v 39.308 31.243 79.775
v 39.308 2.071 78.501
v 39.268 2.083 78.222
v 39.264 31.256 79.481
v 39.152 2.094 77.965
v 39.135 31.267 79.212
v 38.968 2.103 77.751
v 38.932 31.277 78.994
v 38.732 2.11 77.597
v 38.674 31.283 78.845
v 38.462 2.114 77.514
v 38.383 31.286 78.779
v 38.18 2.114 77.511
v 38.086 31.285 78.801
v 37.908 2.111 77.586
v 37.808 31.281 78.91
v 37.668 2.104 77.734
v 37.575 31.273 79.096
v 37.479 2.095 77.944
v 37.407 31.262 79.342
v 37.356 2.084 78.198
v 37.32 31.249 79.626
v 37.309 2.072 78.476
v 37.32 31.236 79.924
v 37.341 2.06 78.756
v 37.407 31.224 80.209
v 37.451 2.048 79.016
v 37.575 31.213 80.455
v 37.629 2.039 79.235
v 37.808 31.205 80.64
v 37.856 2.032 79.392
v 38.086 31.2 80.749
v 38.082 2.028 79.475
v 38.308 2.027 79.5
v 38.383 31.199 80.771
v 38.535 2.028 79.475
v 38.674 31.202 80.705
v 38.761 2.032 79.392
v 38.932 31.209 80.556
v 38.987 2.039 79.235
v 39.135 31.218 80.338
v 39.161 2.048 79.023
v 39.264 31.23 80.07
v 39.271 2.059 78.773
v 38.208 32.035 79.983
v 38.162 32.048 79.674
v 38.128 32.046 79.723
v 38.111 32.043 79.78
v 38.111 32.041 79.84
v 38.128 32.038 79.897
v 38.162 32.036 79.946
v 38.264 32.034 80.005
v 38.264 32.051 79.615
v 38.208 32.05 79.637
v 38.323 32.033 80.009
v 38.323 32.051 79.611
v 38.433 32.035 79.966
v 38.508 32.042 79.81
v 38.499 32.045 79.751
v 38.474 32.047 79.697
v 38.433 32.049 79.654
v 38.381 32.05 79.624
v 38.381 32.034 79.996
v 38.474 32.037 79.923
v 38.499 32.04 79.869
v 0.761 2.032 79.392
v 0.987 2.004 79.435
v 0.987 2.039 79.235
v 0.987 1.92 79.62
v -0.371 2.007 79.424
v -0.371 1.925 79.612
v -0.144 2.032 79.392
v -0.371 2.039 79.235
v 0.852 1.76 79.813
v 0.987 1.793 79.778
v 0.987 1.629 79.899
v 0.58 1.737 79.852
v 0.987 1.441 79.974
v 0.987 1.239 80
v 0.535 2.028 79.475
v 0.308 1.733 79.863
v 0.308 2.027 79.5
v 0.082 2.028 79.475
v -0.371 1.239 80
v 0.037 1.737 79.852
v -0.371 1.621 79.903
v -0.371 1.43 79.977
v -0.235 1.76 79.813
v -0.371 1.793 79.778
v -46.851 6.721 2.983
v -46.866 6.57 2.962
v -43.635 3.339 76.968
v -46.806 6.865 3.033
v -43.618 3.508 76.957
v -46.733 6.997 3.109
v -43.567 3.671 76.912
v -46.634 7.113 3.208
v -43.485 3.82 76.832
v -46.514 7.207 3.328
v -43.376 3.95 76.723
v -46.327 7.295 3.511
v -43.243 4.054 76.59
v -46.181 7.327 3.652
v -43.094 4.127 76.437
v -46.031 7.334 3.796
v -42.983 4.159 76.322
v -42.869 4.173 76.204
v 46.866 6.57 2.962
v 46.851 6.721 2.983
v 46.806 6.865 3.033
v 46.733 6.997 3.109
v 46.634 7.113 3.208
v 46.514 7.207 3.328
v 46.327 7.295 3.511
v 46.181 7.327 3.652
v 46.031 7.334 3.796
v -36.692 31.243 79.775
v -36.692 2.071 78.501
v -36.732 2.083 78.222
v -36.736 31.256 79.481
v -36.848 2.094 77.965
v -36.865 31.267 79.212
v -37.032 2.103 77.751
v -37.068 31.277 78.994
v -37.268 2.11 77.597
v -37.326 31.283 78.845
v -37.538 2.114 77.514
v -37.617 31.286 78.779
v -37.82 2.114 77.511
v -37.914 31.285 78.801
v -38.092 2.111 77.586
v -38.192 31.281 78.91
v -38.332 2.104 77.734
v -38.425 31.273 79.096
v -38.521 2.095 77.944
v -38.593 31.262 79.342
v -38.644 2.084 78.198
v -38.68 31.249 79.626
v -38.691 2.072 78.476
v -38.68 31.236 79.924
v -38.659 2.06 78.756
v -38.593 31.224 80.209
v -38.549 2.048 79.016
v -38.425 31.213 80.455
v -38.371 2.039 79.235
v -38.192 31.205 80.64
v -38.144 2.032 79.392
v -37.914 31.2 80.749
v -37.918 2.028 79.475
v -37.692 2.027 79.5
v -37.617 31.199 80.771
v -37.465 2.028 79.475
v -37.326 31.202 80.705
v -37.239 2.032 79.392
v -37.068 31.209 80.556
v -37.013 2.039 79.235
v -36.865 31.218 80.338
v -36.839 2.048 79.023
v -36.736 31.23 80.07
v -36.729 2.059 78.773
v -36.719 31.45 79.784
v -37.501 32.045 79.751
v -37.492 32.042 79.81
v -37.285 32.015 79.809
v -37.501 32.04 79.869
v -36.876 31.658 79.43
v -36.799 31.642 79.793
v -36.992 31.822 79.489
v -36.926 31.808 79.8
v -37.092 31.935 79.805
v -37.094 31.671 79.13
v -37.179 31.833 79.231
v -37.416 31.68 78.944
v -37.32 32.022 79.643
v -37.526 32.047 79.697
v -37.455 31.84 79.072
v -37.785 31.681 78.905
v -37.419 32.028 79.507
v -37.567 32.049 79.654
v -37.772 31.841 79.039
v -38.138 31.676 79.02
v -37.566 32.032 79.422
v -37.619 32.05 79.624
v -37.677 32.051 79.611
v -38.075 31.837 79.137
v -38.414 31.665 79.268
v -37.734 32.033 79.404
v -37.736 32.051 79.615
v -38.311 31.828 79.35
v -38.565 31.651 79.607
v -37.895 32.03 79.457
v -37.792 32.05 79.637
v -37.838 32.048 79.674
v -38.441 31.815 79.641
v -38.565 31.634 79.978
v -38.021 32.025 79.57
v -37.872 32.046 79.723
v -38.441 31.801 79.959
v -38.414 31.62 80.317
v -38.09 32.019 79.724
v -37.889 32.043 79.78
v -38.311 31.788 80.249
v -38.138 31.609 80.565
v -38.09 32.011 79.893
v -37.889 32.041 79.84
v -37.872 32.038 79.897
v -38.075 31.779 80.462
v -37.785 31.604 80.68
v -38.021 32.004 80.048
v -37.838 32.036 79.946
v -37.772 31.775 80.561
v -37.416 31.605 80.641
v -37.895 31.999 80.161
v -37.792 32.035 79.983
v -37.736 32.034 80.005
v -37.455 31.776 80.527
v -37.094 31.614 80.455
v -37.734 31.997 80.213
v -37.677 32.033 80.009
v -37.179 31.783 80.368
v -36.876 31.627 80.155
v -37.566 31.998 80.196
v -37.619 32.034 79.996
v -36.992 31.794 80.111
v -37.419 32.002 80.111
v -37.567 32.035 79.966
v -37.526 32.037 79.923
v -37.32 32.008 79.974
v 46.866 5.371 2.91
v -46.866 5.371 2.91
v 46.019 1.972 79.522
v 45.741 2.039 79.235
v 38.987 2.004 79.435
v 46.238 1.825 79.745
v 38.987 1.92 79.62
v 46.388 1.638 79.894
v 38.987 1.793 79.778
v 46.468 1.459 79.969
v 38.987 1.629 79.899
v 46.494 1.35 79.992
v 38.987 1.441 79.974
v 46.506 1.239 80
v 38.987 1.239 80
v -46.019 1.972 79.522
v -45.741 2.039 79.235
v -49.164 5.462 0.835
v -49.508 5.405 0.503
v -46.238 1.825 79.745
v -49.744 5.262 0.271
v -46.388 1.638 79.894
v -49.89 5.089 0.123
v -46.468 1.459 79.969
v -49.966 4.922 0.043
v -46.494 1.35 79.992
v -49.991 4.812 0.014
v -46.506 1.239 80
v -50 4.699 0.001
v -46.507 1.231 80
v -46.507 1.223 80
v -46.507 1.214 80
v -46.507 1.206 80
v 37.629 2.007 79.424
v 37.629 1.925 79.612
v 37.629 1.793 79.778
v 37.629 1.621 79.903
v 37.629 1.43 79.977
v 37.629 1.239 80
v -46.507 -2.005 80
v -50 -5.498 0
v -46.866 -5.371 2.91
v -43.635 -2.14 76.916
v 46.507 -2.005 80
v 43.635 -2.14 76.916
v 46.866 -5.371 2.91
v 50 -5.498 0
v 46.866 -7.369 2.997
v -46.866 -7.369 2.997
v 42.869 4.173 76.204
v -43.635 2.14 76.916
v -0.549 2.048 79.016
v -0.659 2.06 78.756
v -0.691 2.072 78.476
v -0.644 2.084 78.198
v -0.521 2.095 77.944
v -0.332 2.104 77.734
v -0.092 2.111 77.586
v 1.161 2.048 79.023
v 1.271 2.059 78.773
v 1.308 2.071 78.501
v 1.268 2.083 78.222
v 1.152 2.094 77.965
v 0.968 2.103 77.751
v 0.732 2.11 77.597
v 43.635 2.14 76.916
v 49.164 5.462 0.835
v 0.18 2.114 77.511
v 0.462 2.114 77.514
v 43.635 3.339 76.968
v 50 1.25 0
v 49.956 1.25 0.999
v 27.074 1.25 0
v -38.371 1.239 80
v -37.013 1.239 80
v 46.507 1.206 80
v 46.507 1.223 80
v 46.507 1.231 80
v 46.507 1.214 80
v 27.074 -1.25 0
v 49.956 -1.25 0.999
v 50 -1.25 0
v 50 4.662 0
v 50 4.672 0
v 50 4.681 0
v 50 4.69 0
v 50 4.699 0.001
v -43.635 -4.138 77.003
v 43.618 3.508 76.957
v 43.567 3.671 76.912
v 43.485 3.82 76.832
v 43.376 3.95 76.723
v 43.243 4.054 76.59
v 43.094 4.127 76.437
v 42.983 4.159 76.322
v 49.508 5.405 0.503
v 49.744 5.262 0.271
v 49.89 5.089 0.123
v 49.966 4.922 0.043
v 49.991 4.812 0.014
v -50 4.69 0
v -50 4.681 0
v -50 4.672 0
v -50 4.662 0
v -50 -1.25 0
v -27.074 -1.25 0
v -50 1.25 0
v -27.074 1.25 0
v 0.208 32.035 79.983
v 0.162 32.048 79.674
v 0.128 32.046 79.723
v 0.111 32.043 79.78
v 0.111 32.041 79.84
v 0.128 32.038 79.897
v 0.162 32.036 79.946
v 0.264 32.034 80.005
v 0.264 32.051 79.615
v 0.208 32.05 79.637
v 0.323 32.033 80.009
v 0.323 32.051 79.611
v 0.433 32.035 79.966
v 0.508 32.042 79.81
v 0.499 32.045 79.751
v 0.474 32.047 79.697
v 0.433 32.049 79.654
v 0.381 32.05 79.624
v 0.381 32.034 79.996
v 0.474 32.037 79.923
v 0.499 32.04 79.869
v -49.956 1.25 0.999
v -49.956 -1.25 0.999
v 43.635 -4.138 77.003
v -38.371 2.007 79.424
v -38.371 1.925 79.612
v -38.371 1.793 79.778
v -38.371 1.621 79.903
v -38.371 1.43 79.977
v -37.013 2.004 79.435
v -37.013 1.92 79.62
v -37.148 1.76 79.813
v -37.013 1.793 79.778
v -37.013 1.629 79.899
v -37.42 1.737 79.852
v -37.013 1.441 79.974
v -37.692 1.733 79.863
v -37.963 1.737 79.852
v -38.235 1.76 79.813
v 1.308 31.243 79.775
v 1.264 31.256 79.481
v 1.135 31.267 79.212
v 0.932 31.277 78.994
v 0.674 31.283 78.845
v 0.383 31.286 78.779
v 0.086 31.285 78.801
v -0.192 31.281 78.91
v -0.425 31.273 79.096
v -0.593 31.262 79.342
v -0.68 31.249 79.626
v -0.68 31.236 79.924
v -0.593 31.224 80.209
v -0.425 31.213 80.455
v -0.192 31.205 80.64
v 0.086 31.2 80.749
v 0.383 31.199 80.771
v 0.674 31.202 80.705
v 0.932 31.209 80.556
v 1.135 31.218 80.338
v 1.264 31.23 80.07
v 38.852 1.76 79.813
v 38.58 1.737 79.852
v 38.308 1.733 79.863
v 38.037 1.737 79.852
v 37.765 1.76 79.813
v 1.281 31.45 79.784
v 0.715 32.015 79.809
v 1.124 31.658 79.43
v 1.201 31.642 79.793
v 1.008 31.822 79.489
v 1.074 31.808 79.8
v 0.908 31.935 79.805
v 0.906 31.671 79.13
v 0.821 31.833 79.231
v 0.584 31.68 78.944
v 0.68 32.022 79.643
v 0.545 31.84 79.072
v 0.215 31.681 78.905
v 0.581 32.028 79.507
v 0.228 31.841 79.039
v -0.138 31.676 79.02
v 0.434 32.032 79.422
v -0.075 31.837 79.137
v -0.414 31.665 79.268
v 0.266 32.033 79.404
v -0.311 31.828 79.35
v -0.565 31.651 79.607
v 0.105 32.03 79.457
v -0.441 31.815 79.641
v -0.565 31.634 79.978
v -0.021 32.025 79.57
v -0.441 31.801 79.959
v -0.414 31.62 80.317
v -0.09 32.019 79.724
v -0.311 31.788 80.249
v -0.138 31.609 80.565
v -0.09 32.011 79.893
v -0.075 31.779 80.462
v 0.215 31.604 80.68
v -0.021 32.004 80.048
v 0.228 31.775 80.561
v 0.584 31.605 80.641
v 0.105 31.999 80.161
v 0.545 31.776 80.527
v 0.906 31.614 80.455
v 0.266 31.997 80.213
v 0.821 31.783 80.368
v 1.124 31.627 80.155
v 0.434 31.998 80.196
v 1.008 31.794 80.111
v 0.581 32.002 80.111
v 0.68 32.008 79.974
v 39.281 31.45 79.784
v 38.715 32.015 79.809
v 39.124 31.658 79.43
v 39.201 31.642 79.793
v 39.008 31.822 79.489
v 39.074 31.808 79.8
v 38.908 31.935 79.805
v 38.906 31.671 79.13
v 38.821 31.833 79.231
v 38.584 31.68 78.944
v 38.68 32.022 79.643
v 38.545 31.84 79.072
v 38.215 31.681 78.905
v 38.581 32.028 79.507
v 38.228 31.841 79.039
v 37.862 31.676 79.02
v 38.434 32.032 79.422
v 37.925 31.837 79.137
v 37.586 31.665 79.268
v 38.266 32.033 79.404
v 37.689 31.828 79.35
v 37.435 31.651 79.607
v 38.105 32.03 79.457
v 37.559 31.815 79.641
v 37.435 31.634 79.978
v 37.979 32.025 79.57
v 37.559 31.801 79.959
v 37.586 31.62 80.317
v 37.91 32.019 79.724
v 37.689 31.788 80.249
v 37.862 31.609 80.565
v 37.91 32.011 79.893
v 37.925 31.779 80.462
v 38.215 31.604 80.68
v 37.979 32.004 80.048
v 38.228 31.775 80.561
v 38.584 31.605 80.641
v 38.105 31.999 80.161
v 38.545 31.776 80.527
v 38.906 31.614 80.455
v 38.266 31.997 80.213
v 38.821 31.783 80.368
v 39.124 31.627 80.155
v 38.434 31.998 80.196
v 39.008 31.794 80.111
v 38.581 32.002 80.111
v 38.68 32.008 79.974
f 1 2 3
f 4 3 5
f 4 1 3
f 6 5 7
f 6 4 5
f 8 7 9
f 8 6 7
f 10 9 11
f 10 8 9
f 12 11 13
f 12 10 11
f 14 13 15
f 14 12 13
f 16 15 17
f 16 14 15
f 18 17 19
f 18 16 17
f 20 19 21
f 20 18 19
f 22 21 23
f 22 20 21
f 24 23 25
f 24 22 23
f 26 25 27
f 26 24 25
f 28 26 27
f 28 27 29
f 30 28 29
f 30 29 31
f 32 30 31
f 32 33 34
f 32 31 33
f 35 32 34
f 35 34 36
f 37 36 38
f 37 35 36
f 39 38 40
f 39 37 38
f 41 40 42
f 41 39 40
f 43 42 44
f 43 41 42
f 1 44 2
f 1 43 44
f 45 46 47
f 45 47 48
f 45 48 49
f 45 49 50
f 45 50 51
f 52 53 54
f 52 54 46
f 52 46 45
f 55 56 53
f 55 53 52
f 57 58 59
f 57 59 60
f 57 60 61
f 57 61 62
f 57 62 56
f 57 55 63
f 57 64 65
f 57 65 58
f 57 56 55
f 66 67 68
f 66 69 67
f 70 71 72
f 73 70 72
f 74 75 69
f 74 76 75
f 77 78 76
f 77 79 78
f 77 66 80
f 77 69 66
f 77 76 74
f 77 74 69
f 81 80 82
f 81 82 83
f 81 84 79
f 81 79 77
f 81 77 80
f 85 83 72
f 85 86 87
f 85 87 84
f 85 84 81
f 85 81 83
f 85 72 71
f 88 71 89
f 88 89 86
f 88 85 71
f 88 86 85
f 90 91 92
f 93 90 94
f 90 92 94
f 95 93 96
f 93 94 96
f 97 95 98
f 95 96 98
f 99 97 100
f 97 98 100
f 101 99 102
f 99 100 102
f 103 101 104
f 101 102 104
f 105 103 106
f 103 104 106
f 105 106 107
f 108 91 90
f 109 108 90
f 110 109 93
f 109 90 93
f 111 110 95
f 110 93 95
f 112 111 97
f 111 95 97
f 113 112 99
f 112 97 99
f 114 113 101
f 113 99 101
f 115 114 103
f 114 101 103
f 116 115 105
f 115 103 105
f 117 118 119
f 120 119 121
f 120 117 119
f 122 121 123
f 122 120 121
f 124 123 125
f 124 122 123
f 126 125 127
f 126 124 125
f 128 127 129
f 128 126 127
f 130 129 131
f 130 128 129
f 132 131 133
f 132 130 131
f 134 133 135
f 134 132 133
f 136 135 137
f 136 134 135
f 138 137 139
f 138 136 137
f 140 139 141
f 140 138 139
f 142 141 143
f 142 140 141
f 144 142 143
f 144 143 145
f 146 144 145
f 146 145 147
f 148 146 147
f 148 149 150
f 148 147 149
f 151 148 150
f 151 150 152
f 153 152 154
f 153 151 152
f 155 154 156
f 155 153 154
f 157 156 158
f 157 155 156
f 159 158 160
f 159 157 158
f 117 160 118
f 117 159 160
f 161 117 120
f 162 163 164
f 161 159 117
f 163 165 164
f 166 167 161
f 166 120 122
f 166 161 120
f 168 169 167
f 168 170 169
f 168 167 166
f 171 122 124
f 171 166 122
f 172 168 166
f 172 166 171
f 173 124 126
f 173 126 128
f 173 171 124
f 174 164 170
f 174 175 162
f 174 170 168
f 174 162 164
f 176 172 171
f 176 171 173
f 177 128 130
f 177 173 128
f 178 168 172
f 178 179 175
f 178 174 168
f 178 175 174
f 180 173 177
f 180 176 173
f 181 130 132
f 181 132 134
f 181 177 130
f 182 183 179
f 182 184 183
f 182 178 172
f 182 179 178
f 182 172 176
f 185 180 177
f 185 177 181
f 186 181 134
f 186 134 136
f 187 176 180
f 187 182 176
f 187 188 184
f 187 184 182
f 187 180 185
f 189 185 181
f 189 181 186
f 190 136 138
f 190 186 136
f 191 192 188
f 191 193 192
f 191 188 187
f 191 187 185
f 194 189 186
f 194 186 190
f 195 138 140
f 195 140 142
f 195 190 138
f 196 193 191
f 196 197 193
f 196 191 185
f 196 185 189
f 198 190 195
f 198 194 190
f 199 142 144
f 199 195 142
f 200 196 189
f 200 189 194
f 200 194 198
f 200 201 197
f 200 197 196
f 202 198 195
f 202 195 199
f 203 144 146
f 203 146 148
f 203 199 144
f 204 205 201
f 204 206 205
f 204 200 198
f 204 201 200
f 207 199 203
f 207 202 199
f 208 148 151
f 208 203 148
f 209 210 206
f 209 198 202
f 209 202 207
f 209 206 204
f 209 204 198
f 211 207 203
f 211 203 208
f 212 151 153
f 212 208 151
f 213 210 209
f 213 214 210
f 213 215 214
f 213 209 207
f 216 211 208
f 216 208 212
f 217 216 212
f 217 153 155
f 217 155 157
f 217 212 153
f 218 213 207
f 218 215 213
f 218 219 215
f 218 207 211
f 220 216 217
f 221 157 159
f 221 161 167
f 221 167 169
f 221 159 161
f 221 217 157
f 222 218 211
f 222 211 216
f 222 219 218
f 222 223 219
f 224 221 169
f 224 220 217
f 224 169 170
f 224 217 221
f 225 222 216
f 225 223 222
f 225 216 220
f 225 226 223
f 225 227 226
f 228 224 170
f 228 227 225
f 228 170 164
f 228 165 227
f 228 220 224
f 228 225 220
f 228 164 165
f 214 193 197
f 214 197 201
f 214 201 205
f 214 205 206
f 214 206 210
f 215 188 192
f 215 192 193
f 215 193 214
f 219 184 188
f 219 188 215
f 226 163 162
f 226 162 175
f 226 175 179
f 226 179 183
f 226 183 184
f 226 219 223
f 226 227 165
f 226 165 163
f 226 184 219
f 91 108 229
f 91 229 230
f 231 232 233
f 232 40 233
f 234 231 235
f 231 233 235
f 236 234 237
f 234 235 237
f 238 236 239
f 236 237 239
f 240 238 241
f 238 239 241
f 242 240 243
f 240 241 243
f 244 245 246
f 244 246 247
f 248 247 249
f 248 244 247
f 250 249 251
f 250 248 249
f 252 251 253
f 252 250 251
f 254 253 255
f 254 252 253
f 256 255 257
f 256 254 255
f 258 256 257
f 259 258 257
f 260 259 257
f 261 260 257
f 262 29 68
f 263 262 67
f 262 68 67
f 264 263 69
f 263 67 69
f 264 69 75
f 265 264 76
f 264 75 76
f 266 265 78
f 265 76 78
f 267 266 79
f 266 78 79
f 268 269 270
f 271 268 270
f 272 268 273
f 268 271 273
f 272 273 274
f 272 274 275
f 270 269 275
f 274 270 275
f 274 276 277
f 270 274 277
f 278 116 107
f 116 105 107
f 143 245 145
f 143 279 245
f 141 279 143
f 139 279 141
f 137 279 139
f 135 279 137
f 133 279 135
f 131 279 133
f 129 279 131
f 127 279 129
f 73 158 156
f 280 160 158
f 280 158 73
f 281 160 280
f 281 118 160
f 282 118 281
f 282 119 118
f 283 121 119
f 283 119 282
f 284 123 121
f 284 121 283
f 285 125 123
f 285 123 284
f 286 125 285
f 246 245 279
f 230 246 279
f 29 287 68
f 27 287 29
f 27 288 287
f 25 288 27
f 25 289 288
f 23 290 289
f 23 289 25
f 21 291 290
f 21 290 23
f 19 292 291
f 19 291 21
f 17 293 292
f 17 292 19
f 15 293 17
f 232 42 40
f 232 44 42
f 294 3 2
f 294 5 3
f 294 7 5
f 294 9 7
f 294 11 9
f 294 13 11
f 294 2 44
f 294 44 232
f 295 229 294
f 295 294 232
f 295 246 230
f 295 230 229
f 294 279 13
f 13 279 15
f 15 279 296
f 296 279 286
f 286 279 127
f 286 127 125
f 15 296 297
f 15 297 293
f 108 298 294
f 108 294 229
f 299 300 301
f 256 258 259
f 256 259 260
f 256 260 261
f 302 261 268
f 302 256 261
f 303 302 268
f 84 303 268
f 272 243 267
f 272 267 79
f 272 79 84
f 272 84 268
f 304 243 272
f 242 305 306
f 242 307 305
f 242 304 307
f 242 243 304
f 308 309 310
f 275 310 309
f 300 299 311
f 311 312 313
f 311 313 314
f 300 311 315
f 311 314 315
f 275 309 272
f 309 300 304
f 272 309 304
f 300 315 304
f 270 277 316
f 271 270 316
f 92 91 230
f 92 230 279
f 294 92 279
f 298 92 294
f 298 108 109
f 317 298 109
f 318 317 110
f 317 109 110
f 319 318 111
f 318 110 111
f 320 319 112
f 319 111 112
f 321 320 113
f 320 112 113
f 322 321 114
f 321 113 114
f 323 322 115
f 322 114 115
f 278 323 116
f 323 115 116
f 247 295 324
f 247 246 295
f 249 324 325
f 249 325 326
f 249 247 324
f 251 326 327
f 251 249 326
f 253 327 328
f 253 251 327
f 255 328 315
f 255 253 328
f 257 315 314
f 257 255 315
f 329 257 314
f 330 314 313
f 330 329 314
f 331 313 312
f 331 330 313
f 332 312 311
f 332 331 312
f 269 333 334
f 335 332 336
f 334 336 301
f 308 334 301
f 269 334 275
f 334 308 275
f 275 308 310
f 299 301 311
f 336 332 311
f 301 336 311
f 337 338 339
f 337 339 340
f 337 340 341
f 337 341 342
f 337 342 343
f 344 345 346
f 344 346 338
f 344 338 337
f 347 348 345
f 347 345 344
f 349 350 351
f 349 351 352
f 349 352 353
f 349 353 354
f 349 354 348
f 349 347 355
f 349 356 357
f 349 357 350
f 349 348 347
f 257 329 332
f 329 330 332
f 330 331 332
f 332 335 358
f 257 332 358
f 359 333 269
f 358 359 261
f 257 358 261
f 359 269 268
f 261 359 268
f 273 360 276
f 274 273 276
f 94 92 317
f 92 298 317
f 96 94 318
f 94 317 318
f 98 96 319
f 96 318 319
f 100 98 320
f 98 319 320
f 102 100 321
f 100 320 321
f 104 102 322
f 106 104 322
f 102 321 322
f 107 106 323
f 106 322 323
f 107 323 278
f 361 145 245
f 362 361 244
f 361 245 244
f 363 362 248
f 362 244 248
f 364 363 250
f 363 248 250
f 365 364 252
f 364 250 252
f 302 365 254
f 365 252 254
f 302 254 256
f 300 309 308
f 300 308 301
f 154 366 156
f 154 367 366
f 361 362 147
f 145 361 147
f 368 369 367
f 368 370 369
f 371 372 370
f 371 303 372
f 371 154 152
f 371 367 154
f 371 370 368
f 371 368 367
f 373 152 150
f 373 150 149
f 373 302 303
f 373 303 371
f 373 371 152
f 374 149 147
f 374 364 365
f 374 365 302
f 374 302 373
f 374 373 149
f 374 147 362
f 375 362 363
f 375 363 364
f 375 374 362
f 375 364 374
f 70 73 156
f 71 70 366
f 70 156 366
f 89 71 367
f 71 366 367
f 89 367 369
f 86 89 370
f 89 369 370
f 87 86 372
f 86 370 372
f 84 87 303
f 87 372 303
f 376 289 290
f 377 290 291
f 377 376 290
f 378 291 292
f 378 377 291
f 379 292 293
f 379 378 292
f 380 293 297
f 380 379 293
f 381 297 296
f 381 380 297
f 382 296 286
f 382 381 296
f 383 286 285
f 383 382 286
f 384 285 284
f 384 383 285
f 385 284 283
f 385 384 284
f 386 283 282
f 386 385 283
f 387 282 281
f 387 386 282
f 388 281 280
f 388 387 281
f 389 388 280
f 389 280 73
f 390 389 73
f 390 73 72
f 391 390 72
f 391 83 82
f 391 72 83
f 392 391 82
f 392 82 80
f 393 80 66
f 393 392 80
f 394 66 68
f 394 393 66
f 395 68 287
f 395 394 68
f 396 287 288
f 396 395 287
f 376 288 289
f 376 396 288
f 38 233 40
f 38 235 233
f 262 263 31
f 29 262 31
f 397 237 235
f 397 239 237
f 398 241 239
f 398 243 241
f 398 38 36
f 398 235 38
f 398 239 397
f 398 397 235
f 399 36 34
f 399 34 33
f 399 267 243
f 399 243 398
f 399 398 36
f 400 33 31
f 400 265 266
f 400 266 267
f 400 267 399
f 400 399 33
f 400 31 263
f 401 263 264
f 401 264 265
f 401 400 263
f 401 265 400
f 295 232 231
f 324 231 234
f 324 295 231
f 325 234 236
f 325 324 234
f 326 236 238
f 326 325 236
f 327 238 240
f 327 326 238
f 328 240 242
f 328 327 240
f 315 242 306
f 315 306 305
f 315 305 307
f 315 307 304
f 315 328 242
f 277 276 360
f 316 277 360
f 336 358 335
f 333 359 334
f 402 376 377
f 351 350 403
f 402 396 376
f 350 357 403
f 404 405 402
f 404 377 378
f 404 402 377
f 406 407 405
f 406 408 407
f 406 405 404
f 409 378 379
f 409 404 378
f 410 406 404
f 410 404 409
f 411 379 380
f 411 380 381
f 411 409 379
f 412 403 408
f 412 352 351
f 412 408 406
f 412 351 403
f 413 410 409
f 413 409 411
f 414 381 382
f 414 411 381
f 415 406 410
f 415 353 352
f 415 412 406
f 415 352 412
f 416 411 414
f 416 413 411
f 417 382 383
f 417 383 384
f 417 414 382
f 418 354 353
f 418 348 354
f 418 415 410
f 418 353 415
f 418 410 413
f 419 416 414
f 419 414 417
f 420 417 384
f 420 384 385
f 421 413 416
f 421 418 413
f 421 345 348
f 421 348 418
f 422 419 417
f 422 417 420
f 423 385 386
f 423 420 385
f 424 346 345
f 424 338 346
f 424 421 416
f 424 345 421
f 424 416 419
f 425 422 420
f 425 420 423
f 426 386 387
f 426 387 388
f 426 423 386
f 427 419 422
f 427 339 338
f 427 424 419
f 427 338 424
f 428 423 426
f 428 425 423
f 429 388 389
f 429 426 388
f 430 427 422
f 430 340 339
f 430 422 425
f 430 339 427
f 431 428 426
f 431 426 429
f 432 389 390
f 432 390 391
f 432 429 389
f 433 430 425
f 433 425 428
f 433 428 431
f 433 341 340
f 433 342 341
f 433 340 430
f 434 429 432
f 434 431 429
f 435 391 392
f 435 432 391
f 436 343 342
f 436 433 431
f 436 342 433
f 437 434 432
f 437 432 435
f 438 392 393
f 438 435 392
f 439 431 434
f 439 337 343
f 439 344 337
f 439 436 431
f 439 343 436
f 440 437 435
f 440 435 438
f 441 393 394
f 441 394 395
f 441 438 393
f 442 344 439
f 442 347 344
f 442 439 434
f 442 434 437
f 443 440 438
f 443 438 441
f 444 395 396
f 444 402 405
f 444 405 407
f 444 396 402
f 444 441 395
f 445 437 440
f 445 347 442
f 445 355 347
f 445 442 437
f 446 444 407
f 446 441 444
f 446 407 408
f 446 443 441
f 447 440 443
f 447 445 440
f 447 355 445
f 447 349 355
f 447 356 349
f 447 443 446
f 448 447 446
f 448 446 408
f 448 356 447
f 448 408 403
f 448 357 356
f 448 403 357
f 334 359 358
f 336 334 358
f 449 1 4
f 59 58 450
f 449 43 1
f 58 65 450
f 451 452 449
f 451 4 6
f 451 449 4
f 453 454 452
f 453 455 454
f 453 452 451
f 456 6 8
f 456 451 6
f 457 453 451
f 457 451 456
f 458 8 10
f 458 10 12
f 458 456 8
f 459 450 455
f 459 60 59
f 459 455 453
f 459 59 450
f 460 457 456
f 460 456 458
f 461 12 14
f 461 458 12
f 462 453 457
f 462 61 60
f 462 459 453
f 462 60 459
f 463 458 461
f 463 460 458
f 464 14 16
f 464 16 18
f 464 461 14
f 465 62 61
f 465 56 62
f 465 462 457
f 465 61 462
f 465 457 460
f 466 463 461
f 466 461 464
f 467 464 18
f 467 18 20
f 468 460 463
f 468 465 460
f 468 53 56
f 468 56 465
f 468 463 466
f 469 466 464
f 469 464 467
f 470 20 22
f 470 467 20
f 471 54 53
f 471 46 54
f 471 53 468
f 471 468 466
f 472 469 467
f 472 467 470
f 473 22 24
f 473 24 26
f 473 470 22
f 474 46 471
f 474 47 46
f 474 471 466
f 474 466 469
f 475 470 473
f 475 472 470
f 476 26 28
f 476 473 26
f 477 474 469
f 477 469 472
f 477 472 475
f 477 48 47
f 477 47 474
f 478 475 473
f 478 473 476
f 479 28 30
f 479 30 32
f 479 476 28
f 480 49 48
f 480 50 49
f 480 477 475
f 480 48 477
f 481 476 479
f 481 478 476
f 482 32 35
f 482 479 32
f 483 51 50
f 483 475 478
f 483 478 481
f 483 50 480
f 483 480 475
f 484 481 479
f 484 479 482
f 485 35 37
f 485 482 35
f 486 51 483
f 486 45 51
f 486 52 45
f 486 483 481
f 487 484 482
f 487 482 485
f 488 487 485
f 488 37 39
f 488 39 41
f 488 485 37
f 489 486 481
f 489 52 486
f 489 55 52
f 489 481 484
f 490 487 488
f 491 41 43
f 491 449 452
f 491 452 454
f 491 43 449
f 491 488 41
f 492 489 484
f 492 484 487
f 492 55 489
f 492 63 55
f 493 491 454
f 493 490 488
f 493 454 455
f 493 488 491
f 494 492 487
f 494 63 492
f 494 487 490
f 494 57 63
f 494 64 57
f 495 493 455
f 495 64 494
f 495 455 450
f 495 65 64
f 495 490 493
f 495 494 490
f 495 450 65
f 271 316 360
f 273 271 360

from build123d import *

# Parameters (mm, degrees)
ESQUISSE1_W                = 100
ESQUISSE1_H                = 15
BOSS_EXTRU_1_DEPTH         = 80
BOSS_EXTRU_1_TAPER         = 2.5
ESQUISSE2_W                = 1
ESQUISSE2_H                = 2.5
ENL_V_MAT_EXTRU_1_DEPTH    = 127.859596195
ENL_V_MAT_EXTRU_2_DEPTH    = 2
ESQUISSE5_R                = 1
R_P_TITION_LIN_AIRE1_COUNT = 3
R_P_TITION_LIN_AIRE1_PITCH = 38
CONG_1_R                   = 0.8
CONG_2_R                   = 0.8


with BuildPart() as part:
    # Esquisse1 → Boss.-Extru.1 (new body)
    with BuildSketch(Plane.XY):
        Rectangle(ESQUISSE1_W, ESQUISSE1_H)
    extrude(amount=BOSS_EXTRU_1_DEPTH, taper=BOSS_EXTRU_1_TAPER)

    # Esquisse2 → Enlèv. mat.-Extru.1 (cut, through all)
    with BuildSketch(Plane(origin=(49.904867452, 0, 2.178893569), x_dir=(0.043619387365336104, 0, -0.9990482215818578), z_dir=(0.9990482215818577, 0, 0.0436193873653361))):
        with Locations((1.680969368, 0)):
            Rectangle(ESQUISSE2_W, ESQUISSE2_H)
    enl_v_mat_extru_1 = extrude(amount=-ENL_V_MAT_EXTRU_1_DEPTH, mode=Mode.SUBTRACT)

    # Symétrie1: Enlèv. mat.-Extru.1 across plane
    add(enl_v_mat_extru_1.mirror(Plane(origin=(0, 0, 0), x_dir=(0, 0, 1), z_dir=(1, 0, 0))), mode=Mode.SUBTRACT)

    # Esquisse3 → Enlèv. mat.-Extru.2 (cut)
    with BuildSketch(Plane(origin=(0, 7.485730118, 0.326834035), x_dir=(1, 0, 0), z_dir=(0, 0.9990482215818577, 0.0436193873653361))):
        Polygon((53.133710782, 3.327145405), (-53.133710782, 3.327145405), (-49.379119025, -82.749069408), (49.379119025, -82.749069408), align=None)
        Polygon((46.866289218, -2.672854595), (-46.866289218, -2.672854595), (-43.635130109, -76.749069408), (43.635130109, -76.749069408), align=None, mode=Mode.SUBTRACT)
    enl_v_mat_extru_2 = extrude(amount=-ENL_V_MAT_EXTRU_2_DEPTH, mode=Mode.SUBTRACT)

    # Symétrie2: Enlèv. mat.-Extru.2 across plane
    add(enl_v_mat_extru_2.mirror(Plane.ZX), mode=Mode.SUBTRACT)

    # Balayage1: sweep along a path in Esquisse4
    with BuildLine(Plane(origin=(0, -3.347747388, 76.6760213), x_dir=(1, 0, 0), z_dir=(0, -0.043619387365336104, 0.9990482215818578))) as balayage1_path:
        Line((-37.620500895, 5.492861662), (-37.620500895, 35.492861662))
    # Esquisse5 → Balayage1 (sweep)
    with BuildSketch(Plane(origin=(0, 5.487633675, 0.239595261), x_dir=(1, 0, 0), z_dir=(0, 0.9990482215818578, 0.04361938736533611))):
        with Locations((-37.691661974, -78.336391294)):
            Circle(ESQUISSE5_R)
    balayage1 = sweep(path=balayage1_path.line)

    # Répétition linéaire1: Balayage1 ×3
    with Locations(*[(i * R_P_TITION_LIN_AIRE1_PITCH, 0, 0) for i in range(1, R_P_TITION_LIN_AIRE1_COUNT)]):
        add(balayage1)

    # Congé1
    cong_1_edges = [part.edges().sort_by_distance(p)[0] for p in [
        (-38.691661974, 32.042094925, 79.810009289),
        (-0.691661974, 32.042094925, 79.810009289),
        (37.308338026, 32.042094925, 79.810009289),
    ]]
    fillet(cong_1_edges, radius=CONG_1_R)

    # Congé2
    cong_2_edges = [part.edges().sort_by_distance(p)[0] for p in [
        (0, 2.005219197, 80),
        (0, 5.49809463, 0),
        (-48.253562284, 3.751656913, 40),
        (48.253562284, 3.751656913, 40),
        (45.250709663, 5.753562284, 40),
        (0, 4.137982729, 77.002855335),
        (-45.250709663, 5.753562284, 40),
        (0, 7.369141838, 2.997144665),
    ]]
    fillet(cong_2_edges, radius=CONG_2_R)


solid = part.part
